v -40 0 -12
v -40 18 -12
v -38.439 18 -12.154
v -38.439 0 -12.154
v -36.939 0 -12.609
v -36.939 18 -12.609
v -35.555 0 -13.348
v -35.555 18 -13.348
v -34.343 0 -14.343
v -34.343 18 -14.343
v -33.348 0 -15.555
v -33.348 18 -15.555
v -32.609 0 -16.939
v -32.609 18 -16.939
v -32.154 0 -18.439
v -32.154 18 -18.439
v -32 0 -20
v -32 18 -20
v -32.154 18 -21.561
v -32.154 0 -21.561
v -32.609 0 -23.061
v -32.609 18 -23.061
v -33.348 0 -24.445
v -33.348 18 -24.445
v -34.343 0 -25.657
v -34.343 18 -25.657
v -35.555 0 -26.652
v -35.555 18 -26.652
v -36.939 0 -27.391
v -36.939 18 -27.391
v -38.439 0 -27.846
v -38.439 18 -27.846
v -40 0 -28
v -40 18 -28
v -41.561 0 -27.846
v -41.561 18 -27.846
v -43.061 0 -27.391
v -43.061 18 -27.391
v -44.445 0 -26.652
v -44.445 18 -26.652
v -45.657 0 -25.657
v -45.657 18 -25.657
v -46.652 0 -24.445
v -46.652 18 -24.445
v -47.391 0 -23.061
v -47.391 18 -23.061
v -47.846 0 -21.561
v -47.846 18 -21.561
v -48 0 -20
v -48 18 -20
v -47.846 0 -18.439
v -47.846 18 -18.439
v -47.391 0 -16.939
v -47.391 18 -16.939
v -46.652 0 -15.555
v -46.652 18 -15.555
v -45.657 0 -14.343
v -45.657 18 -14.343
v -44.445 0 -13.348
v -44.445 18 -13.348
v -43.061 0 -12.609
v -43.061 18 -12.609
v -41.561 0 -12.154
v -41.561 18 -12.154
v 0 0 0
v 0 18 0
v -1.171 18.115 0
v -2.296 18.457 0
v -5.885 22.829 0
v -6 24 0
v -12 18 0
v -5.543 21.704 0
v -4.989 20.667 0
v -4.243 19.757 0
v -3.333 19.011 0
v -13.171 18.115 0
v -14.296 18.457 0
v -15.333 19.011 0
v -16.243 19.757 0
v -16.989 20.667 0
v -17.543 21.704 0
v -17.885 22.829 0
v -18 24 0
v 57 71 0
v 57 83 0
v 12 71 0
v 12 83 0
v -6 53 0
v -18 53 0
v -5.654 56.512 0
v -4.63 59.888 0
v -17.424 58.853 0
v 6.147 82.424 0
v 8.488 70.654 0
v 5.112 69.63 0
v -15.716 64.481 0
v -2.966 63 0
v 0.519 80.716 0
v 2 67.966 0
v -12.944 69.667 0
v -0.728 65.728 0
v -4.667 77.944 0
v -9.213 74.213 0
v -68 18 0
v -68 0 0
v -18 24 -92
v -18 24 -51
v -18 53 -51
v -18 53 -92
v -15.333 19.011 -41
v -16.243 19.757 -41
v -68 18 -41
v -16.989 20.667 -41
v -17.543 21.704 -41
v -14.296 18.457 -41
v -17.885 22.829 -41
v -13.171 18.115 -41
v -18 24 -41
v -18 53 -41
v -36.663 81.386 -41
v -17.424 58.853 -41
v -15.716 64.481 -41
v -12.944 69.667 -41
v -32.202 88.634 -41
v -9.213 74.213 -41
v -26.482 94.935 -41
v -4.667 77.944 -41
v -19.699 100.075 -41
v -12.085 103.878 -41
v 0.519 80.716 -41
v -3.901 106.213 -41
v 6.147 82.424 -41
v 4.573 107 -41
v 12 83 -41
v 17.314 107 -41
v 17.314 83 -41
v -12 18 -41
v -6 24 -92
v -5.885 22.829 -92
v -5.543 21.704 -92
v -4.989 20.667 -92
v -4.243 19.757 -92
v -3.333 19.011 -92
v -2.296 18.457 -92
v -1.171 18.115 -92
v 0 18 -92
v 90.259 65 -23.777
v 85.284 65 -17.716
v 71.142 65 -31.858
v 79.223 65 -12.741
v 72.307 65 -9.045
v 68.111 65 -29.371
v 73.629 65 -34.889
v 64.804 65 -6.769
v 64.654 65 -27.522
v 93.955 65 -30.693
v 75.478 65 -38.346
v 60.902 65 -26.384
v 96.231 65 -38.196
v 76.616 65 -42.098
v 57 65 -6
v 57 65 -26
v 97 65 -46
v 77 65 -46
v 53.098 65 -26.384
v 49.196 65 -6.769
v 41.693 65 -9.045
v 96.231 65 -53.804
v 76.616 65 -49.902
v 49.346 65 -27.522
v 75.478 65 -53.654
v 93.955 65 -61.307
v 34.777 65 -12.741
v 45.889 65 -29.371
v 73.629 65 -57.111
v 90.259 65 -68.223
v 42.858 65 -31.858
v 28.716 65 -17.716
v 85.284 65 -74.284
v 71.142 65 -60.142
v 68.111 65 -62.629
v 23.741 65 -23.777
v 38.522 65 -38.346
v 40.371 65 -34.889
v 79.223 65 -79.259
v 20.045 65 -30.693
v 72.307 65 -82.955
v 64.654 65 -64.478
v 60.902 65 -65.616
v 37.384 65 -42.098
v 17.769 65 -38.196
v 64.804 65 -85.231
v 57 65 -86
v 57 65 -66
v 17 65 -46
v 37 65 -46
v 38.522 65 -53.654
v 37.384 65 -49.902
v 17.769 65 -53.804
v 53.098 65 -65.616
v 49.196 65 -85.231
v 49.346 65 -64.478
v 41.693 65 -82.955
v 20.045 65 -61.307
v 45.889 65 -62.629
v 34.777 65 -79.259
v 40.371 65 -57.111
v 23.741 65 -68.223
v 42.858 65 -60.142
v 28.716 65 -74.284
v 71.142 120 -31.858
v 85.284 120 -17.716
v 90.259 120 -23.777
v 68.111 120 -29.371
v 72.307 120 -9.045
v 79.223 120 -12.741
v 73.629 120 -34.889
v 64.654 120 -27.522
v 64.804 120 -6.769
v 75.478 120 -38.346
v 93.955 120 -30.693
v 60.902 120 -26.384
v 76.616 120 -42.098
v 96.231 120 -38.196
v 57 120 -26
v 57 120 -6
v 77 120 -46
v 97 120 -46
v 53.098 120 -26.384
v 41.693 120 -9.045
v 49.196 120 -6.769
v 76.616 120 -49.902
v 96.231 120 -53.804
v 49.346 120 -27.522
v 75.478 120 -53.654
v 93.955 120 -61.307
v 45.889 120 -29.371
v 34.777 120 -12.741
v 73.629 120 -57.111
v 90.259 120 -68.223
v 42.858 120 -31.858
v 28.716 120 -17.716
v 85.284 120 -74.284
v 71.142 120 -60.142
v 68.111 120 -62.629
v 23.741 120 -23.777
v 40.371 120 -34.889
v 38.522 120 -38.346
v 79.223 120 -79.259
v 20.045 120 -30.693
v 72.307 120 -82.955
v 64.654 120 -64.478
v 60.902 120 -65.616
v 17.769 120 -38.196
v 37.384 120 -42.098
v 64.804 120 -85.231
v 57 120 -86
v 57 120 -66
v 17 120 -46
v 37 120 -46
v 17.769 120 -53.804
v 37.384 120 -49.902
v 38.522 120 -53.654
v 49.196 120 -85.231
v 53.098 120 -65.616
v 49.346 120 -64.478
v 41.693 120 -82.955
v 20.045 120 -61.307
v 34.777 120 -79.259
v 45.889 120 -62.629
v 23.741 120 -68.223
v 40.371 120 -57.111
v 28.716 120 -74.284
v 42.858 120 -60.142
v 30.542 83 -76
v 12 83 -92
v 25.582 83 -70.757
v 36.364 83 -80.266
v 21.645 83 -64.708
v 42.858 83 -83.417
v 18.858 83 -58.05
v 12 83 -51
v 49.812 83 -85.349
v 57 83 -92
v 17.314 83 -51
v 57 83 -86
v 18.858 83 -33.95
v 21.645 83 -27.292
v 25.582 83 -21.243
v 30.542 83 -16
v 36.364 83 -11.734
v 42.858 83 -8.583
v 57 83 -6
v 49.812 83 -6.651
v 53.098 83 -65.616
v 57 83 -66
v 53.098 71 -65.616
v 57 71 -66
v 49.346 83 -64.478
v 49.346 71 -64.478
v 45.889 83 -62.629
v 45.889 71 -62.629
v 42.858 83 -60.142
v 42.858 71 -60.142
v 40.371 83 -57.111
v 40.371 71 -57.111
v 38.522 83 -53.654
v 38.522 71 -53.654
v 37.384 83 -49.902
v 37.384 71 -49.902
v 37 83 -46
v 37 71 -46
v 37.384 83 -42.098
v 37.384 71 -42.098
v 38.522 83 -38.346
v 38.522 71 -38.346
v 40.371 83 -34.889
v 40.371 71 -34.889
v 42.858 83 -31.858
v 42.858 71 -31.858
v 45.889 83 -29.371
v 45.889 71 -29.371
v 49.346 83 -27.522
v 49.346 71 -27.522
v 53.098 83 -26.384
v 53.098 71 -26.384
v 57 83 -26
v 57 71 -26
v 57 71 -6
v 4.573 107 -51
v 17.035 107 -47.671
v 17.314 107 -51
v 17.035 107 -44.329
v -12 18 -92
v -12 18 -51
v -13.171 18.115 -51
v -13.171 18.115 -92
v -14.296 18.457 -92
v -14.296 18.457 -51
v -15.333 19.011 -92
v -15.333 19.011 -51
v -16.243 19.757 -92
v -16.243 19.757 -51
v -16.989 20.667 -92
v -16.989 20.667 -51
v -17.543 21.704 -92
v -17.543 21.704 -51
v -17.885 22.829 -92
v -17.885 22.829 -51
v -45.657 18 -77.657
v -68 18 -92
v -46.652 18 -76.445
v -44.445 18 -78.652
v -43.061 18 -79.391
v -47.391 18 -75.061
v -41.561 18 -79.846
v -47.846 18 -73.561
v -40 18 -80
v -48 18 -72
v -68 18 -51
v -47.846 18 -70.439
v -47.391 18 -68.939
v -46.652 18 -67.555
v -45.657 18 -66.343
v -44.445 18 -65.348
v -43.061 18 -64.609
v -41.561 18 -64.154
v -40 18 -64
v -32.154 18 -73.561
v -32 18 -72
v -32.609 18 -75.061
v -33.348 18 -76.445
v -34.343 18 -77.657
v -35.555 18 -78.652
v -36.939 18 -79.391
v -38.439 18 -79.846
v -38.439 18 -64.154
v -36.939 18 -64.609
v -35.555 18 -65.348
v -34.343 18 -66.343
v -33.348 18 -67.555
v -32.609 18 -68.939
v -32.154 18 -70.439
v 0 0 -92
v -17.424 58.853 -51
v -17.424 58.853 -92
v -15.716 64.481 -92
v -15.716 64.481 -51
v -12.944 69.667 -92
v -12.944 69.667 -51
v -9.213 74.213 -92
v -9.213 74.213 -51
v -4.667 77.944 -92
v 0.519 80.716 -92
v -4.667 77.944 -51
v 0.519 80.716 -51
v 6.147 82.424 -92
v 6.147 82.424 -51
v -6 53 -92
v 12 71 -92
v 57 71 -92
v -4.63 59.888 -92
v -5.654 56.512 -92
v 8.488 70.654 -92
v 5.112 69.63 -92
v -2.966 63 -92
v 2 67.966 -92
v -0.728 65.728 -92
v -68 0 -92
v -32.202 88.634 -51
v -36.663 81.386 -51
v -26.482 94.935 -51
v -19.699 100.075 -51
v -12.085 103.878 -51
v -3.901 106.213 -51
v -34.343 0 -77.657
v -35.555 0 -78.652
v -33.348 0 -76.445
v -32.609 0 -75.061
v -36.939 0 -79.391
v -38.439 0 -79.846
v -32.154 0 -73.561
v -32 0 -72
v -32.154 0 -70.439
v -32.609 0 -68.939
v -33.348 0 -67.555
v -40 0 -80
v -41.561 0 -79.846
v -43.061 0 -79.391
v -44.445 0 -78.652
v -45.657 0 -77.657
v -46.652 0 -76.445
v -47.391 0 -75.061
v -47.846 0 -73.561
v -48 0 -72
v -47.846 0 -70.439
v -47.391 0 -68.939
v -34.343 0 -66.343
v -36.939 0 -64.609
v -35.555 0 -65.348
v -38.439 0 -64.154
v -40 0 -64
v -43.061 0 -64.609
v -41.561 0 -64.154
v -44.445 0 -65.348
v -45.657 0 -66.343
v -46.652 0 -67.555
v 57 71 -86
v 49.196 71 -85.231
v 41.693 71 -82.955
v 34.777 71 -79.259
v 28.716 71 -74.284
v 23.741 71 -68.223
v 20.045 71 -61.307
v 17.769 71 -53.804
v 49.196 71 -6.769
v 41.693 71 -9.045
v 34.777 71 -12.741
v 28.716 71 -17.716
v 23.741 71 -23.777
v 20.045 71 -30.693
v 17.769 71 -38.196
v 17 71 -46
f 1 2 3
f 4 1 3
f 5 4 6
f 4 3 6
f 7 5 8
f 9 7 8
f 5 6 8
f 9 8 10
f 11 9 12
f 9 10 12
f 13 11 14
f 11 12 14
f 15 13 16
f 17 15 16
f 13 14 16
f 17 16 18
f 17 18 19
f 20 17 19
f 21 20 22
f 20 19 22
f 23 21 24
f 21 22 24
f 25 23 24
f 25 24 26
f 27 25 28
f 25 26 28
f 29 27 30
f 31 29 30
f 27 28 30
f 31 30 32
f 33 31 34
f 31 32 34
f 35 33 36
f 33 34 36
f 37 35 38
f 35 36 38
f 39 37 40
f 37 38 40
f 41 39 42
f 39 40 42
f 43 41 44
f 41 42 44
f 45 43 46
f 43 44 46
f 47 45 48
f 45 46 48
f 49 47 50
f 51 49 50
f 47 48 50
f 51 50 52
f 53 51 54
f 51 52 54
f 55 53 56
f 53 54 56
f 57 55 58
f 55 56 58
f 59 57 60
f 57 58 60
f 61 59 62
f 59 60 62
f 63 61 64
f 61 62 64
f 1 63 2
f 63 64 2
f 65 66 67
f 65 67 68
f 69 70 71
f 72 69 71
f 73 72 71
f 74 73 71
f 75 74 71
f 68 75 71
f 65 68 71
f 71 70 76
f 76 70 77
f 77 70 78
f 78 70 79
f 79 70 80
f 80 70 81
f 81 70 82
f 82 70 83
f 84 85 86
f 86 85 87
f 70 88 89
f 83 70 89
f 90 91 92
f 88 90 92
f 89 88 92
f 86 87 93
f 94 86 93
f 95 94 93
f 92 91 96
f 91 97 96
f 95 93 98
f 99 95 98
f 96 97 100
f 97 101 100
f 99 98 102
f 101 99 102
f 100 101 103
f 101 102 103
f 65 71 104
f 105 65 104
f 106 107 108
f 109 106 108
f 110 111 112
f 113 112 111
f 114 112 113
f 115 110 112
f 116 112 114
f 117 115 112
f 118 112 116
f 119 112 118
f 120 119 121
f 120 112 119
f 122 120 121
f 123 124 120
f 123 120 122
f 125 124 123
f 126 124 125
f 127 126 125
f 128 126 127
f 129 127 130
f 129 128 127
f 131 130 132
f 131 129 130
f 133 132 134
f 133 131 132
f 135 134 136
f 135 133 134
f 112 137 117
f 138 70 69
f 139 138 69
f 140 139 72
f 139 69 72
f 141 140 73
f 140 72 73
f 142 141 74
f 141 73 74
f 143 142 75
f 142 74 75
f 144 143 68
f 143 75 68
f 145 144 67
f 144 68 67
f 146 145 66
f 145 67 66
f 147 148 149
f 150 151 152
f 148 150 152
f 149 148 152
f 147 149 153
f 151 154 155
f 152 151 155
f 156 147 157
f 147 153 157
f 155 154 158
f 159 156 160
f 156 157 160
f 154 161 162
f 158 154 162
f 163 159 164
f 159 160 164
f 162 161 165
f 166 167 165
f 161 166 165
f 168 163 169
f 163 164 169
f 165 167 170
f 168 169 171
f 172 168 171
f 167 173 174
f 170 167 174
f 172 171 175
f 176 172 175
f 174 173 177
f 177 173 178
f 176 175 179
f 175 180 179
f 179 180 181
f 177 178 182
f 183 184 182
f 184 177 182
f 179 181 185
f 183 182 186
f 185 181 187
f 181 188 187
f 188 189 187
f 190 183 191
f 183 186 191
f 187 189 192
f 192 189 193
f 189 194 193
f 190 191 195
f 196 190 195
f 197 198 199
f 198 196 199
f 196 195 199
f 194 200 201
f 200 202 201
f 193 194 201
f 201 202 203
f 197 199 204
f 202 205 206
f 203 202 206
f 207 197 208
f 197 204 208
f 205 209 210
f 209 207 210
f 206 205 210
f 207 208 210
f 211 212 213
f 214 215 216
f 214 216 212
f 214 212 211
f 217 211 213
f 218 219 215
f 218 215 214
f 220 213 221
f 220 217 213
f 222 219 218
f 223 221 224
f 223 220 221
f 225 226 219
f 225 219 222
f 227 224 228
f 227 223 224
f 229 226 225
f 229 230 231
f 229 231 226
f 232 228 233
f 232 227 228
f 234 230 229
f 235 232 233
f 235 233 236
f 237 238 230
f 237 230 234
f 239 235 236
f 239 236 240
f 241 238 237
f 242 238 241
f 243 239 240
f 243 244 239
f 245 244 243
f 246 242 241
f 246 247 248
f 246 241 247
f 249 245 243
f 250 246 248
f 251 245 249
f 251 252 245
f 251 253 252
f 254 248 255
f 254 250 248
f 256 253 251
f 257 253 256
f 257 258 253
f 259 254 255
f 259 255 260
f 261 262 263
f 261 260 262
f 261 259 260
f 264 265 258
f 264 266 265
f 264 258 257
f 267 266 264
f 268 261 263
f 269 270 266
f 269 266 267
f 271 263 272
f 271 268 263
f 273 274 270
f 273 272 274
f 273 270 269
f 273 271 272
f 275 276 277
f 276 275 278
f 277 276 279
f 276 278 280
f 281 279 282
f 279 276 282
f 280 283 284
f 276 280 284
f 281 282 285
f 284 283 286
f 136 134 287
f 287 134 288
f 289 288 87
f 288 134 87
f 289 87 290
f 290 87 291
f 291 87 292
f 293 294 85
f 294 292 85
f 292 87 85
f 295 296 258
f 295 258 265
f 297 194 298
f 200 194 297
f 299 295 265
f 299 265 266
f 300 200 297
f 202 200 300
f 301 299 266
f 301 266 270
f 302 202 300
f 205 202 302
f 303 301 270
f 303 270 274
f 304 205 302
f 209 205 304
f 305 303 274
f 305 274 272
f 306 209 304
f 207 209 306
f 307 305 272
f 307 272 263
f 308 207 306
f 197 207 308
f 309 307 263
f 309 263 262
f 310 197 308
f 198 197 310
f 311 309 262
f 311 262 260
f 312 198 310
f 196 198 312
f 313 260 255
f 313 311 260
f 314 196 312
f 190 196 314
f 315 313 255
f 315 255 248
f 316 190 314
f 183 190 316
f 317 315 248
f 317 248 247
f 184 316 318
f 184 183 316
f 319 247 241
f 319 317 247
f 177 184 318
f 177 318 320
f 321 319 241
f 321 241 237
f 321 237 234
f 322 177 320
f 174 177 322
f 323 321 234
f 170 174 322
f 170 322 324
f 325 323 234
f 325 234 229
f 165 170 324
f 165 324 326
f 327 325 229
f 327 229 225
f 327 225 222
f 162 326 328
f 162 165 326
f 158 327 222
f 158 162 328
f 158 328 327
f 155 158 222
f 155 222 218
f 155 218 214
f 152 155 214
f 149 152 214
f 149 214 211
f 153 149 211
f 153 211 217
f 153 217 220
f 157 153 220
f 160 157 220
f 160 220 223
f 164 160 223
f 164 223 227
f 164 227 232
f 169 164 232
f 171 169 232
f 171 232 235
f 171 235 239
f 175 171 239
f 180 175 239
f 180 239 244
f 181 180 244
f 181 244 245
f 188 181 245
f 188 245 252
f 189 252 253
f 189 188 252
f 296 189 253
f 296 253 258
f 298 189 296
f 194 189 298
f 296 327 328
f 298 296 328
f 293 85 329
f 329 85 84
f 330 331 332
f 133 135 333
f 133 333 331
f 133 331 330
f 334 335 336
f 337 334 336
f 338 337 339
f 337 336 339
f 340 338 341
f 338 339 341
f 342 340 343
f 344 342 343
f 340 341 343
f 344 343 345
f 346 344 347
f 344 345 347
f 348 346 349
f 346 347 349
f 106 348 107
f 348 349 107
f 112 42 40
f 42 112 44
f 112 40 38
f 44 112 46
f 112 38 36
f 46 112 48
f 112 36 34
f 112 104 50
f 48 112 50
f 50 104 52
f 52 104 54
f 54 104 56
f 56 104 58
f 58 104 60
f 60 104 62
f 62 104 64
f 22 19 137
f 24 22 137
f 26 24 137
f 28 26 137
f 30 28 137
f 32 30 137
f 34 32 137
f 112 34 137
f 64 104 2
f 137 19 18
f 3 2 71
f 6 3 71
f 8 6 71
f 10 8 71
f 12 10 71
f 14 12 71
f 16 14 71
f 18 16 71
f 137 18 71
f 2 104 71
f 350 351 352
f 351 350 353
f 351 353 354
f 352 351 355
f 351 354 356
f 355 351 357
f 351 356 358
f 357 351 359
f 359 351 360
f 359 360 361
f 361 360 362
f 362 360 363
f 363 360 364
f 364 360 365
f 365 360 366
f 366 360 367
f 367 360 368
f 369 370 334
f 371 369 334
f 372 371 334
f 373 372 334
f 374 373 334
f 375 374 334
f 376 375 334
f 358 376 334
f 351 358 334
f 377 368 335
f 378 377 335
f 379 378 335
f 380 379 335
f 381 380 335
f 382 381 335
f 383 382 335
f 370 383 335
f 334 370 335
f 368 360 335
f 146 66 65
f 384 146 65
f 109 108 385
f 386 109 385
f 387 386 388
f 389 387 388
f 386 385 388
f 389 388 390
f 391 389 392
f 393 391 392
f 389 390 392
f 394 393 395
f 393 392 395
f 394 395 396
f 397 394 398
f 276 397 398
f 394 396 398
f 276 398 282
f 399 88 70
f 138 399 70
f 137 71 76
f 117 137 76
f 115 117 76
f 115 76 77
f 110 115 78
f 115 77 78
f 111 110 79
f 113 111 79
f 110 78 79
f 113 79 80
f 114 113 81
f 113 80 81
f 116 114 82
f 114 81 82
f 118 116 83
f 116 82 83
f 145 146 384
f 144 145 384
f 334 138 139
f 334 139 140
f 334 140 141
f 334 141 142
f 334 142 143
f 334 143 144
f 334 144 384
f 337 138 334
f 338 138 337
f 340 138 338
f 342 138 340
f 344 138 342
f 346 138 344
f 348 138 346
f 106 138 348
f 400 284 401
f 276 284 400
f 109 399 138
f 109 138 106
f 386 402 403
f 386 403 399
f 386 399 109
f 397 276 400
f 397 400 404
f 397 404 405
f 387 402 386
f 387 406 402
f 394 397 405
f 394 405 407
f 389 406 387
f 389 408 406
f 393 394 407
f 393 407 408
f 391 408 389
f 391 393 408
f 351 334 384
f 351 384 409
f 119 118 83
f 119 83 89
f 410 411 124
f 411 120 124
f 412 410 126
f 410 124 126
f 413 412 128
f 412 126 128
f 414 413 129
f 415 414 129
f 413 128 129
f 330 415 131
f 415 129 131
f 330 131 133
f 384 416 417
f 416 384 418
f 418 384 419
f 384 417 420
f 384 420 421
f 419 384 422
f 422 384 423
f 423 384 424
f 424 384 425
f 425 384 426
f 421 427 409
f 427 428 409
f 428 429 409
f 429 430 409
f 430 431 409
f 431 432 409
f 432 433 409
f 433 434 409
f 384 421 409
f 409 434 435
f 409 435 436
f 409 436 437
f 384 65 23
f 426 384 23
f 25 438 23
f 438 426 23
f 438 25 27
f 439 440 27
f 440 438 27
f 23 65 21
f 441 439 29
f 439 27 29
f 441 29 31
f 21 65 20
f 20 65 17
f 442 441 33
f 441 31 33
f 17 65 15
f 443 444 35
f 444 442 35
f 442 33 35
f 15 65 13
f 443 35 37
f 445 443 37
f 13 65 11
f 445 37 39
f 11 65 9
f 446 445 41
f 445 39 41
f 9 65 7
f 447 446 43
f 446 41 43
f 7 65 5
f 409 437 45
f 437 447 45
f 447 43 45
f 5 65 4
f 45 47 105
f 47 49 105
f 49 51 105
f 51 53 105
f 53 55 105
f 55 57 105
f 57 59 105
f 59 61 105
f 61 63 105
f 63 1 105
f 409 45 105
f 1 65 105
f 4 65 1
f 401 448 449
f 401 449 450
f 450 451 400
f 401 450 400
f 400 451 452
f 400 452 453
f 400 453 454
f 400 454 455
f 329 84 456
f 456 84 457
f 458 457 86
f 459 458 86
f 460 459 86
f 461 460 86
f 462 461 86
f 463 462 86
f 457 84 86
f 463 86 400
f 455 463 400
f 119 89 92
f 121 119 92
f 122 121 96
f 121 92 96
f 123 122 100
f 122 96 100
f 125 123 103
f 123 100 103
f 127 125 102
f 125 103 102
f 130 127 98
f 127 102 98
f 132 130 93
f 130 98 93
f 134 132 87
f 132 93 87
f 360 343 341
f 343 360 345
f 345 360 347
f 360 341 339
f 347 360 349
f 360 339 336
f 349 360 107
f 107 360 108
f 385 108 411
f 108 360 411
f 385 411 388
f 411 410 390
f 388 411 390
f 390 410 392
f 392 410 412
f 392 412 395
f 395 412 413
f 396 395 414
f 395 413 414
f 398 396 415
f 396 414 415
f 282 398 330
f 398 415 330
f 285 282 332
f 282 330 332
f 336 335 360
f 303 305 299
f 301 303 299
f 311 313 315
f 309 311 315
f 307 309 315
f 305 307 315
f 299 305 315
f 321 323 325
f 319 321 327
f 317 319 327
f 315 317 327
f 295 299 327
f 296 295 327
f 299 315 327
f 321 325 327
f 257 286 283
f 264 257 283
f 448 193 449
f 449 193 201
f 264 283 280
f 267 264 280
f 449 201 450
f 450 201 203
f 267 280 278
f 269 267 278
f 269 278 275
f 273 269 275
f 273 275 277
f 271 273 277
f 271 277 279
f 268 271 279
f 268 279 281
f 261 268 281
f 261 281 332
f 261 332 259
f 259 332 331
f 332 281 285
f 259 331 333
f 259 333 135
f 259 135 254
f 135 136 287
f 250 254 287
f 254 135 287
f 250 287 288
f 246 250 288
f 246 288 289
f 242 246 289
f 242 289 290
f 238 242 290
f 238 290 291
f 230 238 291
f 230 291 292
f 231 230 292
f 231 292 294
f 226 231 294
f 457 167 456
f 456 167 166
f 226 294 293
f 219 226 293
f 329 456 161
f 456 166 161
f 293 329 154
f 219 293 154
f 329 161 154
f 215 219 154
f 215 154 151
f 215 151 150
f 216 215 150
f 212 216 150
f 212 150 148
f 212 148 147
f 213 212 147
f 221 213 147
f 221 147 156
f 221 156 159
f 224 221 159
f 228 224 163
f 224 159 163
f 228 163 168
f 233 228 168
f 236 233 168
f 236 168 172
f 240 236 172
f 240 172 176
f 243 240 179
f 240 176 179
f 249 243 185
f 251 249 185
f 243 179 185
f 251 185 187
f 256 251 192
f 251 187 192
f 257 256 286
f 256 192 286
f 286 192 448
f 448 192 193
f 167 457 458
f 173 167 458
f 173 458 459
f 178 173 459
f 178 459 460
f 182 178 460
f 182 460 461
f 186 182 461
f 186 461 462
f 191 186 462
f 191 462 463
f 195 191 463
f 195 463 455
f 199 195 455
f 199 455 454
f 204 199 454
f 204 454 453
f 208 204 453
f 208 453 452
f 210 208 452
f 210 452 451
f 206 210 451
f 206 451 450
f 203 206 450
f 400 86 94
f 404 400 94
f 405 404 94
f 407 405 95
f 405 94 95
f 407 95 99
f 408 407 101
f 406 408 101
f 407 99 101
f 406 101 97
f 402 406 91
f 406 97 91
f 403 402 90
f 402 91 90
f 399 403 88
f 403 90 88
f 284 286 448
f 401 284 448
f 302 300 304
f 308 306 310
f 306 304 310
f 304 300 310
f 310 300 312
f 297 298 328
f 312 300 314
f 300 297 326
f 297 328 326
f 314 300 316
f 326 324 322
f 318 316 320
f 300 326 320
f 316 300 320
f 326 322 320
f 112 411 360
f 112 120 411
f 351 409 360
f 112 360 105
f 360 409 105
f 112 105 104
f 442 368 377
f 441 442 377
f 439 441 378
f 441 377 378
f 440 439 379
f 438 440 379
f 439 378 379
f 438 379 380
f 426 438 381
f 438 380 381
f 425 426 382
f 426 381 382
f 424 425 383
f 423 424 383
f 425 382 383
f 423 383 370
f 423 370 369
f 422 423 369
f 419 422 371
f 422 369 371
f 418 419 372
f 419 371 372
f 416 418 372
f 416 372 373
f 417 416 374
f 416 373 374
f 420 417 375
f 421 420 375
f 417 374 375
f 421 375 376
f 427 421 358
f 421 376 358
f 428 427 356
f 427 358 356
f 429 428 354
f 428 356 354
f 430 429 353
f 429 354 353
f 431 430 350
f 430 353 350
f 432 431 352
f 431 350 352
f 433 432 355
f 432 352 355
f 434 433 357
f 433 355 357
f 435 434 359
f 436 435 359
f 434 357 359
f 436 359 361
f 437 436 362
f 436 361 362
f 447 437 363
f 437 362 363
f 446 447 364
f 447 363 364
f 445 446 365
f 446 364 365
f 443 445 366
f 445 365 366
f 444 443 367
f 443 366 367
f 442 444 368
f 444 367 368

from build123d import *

# Parameters (mm, degrees)
BOSS_EXTRUDE1_DEPTH = 92
BOSS_EXTRUDE2_START = -18
SKETCH2_R           = 40
SKETCH2_R_2         = 20
BOSS_EXTRUDE2_DEPTH = 55
SKETCH3_R           = 8
CUT_EXTRUDE1_DEPTH  = 18
BOSS_EXTRUDE3_START = -46
BOSS_EXTRUDE3_DEPTH = 5
FILLET1_R           = 46


with BuildPart() as part:
    # Sketch1 → Boss-Extrude1 (new body)
    with BuildSketch(Plane.XY):
        with BuildLine():
            Line((-6, 53), (-6, 24))
            ThreePointArc((-6, 24), (-4.242640687, 19.757359313), (0, 18))
            Line((0, 18), (0, 0))
            Line((0, 0), (-68, 0))
            Line((-68, 0), (-68, 18))
            Line((-68, 18), (-12, 18))
            ThreePointArc((-12, 18), (-16.242640687, 19.757359313), (-18, 24))
            Line((-18, 24), (-18, 53))
            ThreePointArc((-18, 53), (-9.213203436, 74.213203436), (12, 83))
            Line((12, 83), (57, 83))
            Line((57, 83), (57, 71))
            Line((57, 71), (12, 71))
            ThreePointArc((12, 71), (-0.727922061, 65.727922061), (-6, 53))
        make_face()
    extrude(amount=-BOSS_EXTRUDE1_DEPTH)

    # Sketch2 → Boss-Extrude2 (add)
    with BuildSketch(Plane(origin=(0, 83, 0), x_dir=(1, 0, 0), z_dir=(0, 1, 0)).offset(BOSS_EXTRUDE2_START)):
        with Locations(Location((57, 46, 0), (0, 0, 90))):
            Circle(SKETCH2_R)
        with Locations(Location((57, 46, 0), (0, 0, 90))):
            Circle(SKETCH2_R_2, mode=Mode.SUBTRACT)
    extrude(amount=BOSS_EXTRUDE2_DEPTH)

    # Sketch3 → Cut-Extrude1 (cut)
    with BuildSketch(Plane(origin=(0, 18, 0), x_dir=(1, 0, 0), z_dir=(0, 1, 0))):
        with Locations(Location((-40, 20, 0), (0, 0, 270))):
            Circle(SKETCH3_R)
        with Locations(Location((-40, 72, 0), (0, 0, 270))):
            Circle(SKETCH3_R)
    extrude(amount=-CUT_EXTRUDE1_DEPTH, mode=Mode.SUBTRACT)

    # Sketch4 → Boss-Extrude3 (add, symmetric)
    with BuildSketch(Plane.XY.offset(BOSS_EXTRUDE3_START)):
        with BuildLine():
            ThreePointArc((-18, 53), (-9.213203436, 74.213203436), (12, 83))
            Line((12, 83), (17, 83))
            Line((17, 83), (18, 83))
            Line((18, 83), (18, 107))
            Line((18, 107), (-24, 107))
            Line((-24, 107), (-68, 18))
            Line((-68, 18), (-12, 18))
            ThreePointArc((-12, 18), (-16.242640687, 19.757359313), (-18, 24))
            Line((-18, 24), (-18, 53))
        make_face()
    extrude(amount=BOSS_EXTRUDE3_DEPTH, both=True)

    # Fillet1
    fillet1_edges = [part.edges().sort_by_distance(p)[0] for p in [
        (-24, 107, -46),
    ]]
    fillet(fillet1_edges, radius=FILLET1_R)


solid = part.part
